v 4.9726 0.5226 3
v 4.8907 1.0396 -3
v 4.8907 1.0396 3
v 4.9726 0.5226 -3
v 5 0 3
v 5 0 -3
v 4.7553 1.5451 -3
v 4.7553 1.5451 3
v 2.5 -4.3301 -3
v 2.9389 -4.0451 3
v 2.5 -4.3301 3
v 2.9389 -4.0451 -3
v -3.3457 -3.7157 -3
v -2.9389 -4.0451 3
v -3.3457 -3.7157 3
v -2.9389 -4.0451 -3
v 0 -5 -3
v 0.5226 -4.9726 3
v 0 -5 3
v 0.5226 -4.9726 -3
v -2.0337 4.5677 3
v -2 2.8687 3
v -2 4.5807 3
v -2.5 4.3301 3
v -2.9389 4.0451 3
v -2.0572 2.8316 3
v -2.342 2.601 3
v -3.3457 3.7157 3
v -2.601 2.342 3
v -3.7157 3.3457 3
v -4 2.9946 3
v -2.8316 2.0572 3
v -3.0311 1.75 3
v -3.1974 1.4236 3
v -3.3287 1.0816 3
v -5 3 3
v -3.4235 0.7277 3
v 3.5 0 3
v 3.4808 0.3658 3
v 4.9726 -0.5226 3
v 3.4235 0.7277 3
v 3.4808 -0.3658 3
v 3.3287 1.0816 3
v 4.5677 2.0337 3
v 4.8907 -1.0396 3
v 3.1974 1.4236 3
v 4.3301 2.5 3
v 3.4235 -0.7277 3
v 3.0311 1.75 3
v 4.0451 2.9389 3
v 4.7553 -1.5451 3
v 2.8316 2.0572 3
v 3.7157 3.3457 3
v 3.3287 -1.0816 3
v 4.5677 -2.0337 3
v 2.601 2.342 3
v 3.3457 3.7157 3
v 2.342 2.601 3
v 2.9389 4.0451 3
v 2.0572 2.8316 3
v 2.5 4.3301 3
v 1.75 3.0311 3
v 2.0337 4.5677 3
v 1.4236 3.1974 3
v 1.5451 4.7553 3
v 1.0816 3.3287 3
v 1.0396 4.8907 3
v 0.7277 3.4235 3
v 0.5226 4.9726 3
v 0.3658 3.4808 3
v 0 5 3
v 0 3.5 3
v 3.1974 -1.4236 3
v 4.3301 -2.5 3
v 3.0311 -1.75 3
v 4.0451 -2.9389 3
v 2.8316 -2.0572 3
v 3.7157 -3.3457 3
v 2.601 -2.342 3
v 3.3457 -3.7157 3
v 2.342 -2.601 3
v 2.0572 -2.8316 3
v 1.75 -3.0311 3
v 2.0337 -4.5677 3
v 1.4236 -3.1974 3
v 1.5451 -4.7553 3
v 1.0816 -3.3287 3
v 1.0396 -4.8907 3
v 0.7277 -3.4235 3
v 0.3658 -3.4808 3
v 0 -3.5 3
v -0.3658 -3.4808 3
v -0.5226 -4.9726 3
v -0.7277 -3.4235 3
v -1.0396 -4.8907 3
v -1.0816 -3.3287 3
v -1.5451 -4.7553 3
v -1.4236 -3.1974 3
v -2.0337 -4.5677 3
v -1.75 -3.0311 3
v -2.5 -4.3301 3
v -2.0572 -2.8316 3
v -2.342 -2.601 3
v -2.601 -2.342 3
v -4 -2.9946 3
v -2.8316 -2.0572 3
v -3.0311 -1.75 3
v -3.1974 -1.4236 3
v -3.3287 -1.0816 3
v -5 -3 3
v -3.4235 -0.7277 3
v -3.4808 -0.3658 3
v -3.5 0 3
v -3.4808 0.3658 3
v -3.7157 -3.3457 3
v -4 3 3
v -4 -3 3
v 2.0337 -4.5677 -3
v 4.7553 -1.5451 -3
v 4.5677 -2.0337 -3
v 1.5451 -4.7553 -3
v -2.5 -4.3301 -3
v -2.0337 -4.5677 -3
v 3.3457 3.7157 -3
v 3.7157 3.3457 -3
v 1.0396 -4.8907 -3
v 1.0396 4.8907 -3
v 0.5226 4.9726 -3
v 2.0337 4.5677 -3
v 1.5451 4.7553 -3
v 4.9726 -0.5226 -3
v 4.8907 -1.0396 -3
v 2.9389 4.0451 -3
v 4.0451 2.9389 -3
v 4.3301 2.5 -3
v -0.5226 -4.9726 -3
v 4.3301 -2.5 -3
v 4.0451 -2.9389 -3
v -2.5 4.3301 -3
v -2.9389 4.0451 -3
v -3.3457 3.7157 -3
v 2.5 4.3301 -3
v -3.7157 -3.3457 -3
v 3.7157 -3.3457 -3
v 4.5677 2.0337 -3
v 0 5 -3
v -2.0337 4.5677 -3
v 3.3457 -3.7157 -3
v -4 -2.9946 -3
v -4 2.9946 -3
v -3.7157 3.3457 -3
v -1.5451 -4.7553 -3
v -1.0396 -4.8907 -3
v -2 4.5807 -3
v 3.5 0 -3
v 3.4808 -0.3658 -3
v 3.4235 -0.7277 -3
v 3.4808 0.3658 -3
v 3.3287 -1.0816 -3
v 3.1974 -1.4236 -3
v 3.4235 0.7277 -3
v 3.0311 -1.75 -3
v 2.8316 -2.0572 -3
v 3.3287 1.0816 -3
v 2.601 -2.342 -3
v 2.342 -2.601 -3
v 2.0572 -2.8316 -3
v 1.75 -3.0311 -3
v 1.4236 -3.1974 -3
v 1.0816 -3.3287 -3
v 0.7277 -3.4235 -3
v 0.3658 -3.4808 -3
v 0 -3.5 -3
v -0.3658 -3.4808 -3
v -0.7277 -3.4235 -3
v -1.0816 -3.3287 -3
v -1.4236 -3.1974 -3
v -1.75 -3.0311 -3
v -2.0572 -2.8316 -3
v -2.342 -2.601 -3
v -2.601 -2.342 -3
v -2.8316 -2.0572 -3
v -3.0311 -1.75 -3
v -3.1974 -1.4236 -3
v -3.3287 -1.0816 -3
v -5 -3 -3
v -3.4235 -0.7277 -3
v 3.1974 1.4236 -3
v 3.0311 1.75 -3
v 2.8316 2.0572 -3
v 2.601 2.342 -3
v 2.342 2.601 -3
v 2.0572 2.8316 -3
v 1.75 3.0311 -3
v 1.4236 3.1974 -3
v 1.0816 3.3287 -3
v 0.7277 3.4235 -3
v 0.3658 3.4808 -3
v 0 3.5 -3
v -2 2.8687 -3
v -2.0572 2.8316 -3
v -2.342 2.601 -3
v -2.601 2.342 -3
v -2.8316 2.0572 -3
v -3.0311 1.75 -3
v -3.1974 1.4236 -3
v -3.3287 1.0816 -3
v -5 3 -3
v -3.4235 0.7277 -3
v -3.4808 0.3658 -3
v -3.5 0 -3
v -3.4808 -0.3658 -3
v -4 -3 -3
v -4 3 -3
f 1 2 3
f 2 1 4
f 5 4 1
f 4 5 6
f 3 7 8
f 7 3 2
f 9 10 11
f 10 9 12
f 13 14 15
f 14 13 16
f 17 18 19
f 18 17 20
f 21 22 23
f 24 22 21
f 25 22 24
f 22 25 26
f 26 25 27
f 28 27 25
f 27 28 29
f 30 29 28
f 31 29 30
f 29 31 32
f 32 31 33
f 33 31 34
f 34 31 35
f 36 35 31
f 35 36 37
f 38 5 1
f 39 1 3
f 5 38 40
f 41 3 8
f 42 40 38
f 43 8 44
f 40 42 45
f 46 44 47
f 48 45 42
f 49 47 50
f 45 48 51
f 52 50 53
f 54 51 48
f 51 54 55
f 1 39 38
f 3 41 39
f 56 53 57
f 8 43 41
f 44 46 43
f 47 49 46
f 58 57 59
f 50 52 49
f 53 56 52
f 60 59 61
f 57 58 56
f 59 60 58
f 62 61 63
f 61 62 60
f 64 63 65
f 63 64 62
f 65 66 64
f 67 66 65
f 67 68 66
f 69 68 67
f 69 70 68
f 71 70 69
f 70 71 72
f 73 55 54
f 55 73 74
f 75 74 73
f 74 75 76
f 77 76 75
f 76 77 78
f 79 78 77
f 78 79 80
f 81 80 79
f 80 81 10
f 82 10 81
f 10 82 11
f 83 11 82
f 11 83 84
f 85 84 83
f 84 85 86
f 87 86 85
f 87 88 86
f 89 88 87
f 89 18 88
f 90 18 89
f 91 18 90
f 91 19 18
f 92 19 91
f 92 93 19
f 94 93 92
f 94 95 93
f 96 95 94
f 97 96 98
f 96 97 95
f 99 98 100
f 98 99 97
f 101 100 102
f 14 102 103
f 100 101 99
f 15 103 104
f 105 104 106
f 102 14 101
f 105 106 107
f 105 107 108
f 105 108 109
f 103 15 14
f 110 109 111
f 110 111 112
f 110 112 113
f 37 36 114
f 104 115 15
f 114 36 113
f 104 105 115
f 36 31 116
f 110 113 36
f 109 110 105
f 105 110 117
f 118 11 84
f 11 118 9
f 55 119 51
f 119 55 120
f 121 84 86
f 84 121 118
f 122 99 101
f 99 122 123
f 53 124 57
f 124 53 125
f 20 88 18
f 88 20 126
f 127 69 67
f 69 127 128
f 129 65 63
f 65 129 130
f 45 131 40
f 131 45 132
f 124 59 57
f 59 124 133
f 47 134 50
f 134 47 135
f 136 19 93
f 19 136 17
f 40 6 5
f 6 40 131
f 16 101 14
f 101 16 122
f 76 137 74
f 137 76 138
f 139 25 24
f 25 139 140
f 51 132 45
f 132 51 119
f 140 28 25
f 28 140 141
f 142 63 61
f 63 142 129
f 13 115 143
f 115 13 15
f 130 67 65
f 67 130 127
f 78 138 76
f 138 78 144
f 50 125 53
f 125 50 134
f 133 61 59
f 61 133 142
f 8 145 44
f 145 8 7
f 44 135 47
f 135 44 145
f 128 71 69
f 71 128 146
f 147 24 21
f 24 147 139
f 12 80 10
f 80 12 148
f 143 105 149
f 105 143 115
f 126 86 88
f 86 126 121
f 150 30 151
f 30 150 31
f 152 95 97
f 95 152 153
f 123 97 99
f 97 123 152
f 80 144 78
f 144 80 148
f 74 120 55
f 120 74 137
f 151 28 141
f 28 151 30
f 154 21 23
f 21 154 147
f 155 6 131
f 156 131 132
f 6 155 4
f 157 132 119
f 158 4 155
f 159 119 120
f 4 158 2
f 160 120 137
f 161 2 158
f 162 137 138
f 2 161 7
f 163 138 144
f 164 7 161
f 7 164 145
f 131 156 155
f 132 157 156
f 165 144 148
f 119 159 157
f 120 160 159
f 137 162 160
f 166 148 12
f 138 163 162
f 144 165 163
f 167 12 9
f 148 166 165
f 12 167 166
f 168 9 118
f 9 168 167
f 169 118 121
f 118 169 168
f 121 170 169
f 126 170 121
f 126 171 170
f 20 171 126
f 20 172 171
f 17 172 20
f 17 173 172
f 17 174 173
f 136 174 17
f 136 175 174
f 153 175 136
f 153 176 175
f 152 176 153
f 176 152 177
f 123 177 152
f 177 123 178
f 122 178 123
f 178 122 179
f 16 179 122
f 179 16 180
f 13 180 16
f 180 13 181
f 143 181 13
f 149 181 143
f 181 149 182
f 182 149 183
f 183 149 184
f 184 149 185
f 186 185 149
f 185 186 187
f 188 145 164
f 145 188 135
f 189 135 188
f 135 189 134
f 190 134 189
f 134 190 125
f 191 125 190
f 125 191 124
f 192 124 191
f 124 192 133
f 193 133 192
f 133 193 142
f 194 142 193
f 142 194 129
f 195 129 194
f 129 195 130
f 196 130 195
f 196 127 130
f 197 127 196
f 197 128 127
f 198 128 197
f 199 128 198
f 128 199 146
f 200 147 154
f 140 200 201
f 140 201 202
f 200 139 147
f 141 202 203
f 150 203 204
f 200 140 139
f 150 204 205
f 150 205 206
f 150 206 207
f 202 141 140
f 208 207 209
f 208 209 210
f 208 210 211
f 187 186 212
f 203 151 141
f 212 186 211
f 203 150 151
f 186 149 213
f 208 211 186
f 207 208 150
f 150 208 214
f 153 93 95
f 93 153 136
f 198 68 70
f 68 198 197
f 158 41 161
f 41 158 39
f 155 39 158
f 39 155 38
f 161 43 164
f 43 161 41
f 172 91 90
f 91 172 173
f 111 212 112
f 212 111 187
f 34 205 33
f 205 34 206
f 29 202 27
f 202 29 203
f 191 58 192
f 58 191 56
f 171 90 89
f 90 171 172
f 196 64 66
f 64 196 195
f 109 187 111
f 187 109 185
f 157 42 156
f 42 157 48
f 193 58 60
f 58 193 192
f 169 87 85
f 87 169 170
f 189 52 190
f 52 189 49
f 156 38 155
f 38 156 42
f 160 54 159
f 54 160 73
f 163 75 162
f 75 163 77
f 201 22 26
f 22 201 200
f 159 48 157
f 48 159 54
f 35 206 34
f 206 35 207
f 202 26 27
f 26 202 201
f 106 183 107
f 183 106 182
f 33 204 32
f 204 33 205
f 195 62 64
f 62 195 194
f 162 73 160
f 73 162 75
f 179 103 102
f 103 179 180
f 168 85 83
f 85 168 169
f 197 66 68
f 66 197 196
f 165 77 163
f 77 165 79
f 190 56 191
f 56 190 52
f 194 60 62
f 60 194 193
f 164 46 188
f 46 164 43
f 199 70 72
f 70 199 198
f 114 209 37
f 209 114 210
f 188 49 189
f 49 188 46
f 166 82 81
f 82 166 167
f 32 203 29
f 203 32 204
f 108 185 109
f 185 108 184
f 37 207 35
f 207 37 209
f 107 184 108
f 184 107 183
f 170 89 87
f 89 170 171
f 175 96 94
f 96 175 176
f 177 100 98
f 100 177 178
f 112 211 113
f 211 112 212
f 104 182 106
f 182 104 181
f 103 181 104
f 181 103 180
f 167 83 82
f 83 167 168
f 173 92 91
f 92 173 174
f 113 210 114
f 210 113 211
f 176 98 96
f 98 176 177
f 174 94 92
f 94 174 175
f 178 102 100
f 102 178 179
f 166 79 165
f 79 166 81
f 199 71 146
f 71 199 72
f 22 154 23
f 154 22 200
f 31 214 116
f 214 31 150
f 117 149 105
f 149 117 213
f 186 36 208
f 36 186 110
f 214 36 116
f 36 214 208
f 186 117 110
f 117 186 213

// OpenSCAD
$fn=60;

difference(){
cylinder(h = 6, d=10, center = true);
cylinder(h = 9, d=7, center = true);
translate(v = [-2, 2, -4.5])
cube(size = [2,9,9]);
}

translate(v = [-5, -3, -3])
cube(size = [1,6,6]);
